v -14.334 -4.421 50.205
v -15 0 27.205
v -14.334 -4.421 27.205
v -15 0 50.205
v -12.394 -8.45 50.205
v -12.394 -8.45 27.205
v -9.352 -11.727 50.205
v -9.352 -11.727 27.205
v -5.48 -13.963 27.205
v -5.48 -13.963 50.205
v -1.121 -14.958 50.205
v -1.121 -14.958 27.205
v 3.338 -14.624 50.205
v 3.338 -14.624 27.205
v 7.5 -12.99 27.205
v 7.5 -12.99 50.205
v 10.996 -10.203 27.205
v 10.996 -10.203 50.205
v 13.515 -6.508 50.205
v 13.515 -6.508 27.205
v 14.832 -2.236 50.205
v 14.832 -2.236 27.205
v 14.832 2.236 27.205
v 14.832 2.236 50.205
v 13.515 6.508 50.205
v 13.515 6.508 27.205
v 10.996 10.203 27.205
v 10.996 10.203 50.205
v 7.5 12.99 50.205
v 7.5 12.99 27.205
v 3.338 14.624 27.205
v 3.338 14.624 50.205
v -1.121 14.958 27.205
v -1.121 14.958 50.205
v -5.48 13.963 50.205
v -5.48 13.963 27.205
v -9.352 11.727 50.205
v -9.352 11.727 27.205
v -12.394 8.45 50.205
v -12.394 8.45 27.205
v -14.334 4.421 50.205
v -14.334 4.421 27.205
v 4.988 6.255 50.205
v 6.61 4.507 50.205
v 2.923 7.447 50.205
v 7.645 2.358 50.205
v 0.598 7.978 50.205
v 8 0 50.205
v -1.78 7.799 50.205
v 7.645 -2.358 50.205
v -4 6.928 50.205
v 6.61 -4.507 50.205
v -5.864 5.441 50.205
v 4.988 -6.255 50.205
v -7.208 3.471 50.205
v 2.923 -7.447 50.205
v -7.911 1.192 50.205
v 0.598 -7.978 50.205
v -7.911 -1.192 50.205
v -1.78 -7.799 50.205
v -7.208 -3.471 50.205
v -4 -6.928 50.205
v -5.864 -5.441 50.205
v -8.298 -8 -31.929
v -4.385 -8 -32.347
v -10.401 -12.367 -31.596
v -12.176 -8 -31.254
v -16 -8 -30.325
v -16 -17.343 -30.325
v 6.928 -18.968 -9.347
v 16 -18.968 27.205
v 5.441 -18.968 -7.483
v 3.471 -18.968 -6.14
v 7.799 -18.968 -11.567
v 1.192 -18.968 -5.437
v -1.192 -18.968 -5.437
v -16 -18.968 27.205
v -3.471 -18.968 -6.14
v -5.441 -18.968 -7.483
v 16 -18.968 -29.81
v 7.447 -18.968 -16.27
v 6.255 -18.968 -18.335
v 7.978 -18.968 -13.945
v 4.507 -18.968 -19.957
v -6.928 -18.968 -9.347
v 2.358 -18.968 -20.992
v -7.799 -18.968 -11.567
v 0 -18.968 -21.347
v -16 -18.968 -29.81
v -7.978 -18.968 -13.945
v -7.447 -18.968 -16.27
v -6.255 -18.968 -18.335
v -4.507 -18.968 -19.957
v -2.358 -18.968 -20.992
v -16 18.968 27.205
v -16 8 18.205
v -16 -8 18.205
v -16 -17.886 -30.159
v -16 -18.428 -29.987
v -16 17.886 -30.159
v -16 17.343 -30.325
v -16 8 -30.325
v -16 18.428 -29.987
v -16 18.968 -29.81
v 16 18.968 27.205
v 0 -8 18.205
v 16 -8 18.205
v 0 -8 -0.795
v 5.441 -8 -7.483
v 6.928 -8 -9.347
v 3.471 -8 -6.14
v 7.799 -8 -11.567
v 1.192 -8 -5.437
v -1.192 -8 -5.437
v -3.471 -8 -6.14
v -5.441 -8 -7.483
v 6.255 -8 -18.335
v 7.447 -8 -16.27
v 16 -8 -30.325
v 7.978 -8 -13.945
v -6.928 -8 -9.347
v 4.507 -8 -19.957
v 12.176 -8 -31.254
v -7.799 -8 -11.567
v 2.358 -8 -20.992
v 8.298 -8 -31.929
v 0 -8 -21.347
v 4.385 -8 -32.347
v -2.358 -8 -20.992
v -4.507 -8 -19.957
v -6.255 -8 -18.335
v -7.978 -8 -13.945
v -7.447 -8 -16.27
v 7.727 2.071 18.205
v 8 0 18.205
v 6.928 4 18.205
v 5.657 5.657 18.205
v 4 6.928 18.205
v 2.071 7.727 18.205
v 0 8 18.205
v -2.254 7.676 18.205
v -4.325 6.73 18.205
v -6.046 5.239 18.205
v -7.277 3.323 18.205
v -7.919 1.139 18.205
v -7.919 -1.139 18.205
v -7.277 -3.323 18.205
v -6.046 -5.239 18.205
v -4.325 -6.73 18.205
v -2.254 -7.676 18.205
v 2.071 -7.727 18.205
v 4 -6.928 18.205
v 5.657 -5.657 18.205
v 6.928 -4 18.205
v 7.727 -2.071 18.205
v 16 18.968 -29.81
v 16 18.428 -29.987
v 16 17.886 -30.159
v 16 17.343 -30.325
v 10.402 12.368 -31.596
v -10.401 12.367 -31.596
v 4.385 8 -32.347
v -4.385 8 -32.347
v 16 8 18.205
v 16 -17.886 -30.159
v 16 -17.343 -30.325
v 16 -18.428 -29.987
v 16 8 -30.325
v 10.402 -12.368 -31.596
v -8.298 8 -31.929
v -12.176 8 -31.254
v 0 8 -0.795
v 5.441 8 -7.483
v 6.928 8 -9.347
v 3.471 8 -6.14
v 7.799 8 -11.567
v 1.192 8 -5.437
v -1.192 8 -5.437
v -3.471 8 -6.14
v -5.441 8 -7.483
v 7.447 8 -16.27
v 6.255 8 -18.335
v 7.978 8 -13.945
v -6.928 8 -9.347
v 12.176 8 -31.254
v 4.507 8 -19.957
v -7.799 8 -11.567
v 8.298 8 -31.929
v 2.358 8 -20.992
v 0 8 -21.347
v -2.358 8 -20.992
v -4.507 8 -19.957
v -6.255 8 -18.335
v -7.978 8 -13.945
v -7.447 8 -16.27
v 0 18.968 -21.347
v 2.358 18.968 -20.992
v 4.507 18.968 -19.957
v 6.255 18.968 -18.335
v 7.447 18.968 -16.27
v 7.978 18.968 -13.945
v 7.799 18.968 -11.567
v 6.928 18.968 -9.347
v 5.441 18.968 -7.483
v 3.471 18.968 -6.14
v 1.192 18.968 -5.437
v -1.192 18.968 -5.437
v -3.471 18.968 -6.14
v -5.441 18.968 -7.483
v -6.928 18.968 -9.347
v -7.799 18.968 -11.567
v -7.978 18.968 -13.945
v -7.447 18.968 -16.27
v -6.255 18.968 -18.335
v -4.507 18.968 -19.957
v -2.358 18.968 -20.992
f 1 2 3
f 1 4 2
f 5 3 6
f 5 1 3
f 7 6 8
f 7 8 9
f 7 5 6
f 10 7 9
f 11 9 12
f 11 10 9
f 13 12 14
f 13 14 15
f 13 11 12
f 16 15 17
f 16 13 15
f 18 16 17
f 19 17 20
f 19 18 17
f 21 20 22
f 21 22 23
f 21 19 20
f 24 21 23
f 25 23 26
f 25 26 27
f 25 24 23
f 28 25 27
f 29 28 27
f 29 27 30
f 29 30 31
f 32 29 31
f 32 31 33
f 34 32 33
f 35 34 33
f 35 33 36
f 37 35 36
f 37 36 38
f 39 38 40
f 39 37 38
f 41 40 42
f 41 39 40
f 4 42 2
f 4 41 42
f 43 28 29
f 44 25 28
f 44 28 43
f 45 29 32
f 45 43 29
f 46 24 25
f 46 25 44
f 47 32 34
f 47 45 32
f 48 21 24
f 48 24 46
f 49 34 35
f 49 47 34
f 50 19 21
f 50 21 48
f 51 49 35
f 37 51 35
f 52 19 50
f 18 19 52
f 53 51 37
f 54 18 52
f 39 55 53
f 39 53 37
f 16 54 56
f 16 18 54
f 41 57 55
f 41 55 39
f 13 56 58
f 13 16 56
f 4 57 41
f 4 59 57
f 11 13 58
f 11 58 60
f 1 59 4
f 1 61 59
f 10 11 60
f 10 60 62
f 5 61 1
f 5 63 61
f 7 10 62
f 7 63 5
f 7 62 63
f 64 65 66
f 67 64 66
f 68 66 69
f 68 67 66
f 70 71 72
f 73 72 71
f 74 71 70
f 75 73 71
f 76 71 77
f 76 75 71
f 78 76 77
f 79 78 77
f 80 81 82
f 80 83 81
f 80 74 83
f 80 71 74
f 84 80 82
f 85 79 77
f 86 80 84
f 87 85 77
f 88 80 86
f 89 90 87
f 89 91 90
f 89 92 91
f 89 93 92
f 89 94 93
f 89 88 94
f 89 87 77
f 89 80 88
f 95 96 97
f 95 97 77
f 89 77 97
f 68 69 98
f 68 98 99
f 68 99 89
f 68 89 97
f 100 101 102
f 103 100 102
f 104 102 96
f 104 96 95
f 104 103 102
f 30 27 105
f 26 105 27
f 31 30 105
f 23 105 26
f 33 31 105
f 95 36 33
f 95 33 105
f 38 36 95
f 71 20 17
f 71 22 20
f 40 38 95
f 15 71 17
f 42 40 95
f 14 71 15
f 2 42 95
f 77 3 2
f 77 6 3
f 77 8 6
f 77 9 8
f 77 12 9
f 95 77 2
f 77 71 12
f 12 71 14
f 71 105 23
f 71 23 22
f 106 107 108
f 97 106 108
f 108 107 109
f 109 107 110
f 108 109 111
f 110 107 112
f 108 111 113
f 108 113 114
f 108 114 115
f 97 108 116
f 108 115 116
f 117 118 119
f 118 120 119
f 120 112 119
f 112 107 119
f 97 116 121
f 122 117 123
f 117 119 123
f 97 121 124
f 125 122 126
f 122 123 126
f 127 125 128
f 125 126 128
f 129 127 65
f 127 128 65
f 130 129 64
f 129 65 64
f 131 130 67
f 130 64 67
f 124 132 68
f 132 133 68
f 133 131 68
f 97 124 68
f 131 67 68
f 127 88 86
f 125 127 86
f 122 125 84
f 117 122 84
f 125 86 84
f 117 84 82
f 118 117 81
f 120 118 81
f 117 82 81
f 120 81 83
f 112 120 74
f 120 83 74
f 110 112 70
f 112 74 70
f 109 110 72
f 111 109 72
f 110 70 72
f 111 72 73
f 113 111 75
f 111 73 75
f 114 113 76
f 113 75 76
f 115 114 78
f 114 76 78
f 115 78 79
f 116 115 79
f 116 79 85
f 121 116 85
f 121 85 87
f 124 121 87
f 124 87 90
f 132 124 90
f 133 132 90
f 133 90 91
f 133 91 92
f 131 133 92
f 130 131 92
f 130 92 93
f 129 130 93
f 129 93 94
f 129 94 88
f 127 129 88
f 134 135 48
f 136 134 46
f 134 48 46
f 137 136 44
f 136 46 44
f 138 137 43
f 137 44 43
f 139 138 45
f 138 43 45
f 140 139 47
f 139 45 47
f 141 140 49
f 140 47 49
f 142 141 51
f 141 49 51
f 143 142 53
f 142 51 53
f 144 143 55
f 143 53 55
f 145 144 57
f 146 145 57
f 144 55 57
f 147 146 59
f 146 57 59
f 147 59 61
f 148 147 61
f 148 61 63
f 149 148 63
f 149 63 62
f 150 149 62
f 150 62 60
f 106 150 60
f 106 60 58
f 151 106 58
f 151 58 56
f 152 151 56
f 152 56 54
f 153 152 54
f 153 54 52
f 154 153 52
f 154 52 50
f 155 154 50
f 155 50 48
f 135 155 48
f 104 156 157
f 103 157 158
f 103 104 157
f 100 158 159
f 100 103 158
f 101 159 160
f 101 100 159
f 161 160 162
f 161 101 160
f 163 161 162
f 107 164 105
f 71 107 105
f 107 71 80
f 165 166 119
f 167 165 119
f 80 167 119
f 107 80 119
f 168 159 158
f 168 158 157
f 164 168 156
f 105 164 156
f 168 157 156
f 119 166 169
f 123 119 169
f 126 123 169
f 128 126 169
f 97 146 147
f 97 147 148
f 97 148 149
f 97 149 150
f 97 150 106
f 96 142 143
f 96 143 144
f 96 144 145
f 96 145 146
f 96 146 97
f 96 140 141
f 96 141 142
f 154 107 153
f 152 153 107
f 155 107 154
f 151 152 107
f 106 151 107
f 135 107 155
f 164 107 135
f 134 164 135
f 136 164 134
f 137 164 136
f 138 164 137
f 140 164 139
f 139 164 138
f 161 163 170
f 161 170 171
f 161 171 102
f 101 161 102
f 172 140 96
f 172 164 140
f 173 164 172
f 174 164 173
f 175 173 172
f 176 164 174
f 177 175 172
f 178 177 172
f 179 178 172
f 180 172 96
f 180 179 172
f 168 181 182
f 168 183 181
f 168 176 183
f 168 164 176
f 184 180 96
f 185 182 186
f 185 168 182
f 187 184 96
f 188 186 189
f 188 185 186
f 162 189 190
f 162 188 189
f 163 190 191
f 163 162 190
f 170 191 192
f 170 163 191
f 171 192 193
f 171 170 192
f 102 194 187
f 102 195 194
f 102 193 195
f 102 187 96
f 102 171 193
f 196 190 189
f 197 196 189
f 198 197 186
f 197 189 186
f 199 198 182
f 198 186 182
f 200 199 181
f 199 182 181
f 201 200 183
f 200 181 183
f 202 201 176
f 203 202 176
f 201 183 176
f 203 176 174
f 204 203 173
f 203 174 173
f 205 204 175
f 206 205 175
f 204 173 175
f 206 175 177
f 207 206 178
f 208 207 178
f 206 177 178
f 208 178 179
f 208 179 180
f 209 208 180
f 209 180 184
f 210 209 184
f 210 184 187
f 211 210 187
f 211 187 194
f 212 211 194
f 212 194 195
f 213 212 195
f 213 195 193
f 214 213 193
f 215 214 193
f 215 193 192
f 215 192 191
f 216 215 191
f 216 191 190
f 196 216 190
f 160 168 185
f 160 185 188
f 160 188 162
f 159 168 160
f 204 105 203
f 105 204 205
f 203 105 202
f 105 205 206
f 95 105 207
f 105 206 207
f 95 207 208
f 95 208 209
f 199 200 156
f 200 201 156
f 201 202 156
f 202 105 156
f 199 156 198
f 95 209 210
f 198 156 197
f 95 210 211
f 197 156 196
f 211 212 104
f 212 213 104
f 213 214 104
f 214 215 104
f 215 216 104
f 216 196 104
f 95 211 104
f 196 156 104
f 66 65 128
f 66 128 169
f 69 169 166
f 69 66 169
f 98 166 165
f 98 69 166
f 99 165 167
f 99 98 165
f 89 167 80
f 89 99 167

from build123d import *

# Parameters (mm, degrees)
CROQUIS3_W            = 139.658435228
CROQUIS3_H            = 16
CORTAR_EXTRUIR1_DEPTH = 51
CROQUIS4_OUTSIDE_W    = 126.9
CROQUIS4_OUTSIDE_H    = 126.9
CROQUIS4_OUTSIDE_W_2  = 120.050230854
CROQUIS4_OUTSIDE_H_2  = 37.93587295
CORTAR_EXTRUIR2_DEPTH = 107.175895765
CROQUIS5_OUTSIDE_W    = 121.792
CROQUIS5_OUTSIDE_H    = 66.086
CROQUIS5_OUTSIDE_W_2  = 32
CROQUIS5_OUTSIDE_H_2  = 52.876669862
CORTAR_EXTRUIR4_DEPTH = 98.164515307
CROQUIS6_OUTSIDE_W    = 53.342
CROQUIS6_OUTSIDE_H    = 104.342
CROQUIS6_OUTSIDE_R    = 59.713814124
CORTAR_EXTRUIR5_DEPTH = 51
CORTAR_EXTRUIR6_START = -32
CORTAR_EXTRUIR6_DEPTH = 33
CROQUIS8_R            = 8
CORTAR_EXTRUIR7_DEPTH = 65.928309429
CROQUIS9_R            = 8
CORTAR_EXTRUIR8_DEPTH = 51


with BuildPart() as part:
    # Croquis1 → Revolución2 (revolve)
    with BuildSketch(Plane(origin=(0, 0, 0), x_dir=(1, 0, 0), z_dir=(0, 1, 0)), mode=Mode.PRIVATE) as revoluci_n2_sk:
        Polygon((15, -50.205128205), (0, -50.205128205), (0, -18.205128205), (8, -18.205128205), (8, 32.794871795), (46.820512821, 32.794871795), (46.820512821, -27.205128205), (15, -27.205128205), align=None)
    revolve(revoluci_n2_sk.sketch.rotate(Axis((0, 0, -124.102564103), (0, 0, 1)), 180), axis=Axis((0, 0, -124.102564103), (0, 0, 1)))

    # Croquis3 → Cortar-Extruir1 (cut)
    with BuildSketch(Plane(origin=(0, 0, -32.794871795), x_dir=(-1, 0, 0), z_dir=(0, 0, -1))):
        Rectangle(CROQUIS3_W, CROQUIS3_H)
    extrude(amount=-CORTAR_EXTRUIR1_DEPTH, mode=Mode.SUBTRACT)

    # Croquis4 outside → Cortar-Extruir2 (cut, through all)
    with BuildSketch(Plane(origin=(0, 0, -32.794871795), x_dir=(-1, 0, 0), z_dir=(0, 0, -1))):
        Rectangle(CROQUIS4_OUTSIDE_W, CROQUIS4_OUTSIDE_H)
        Rectangle(CROQUIS4_OUTSIDE_W_2, CROQUIS4_OUTSIDE_H_2, mode=Mode.SUBTRACT)
    extrude(amount=-CORTAR_EXTRUIR2_DEPTH, mode=Mode.SUBTRACT)

    # Croquis5 outside → Cortar-Extruir4 (cut, through all)
    with BuildSketch(Plane(origin=(0, 0, -32.794871795), x_dir=(-1, 0, 0), z_dir=(0, 0, -1))):
        Rectangle(CROQUIS5_OUTSIDE_W, CROQUIS5_OUTSIDE_H)
        Rectangle(CROQUIS5_OUTSIDE_W_2, CROQUIS5_OUTSIDE_H_2, mode=Mode.SUBTRACT)
    extrude(amount=-CORTAR_EXTRUIR4_DEPTH, mode=Mode.SUBTRACT)

    # Croquis6 outside → Cortar-Extruir5 (cut)
    with BuildSketch(Plane(origin=(0, 18.967936475, 0), x_dir=(1, 0, 0), z_dir=(0, 1, 0))):
        with Locations((0, -8.705)):
            Rectangle(CROQUIS6_OUTSIDE_W, CROQUIS6_OUTSIDE_H)
        with Locations((0, -27.205128205)):
            Circle(CROQUIS6_OUTSIDE_R, mode=Mode.SUBTRACT)
    extrude(amount=-CORTAR_EXTRUIR5_DEPTH, mode=Mode.SUBTRACT)


with BuildPart() as cortar_extruir5_kept_piece:
    # of the separate pieces the step leaves, the one the design keeps (cortar_extruir5_pieces_kept)
    add(part.part.solids().sort_by_distance((-15, 0, 50.205128205))[0])

    # Cortar-Extruir6: read off the stored shape, not the designer's step
    # Cortar-Extruir6 outline → Cortar-Extruir6 (cut)
    with BuildSketch(Plane(origin=(16, 0, 0), x_dir=(0, 0, -1), z_dir=(1, 0, 0)).offset(CORTAR_EXTRUIR6_START)):
        with BuildLine():
            ThreePointArc((29.810017934, 18.967936475), (31.336160338, 13.54352388), (32.347449433, 8))
            Line((32.347449433, 8), (33.422130035, 0))
            Line((33.422130035, 0), (34, 4.301705749))
            Line((34, 4.301705749), (34, 20))
            Line((34, 20), (29.466668549, 20))
            Line((29.466668549, 20), (29.810017934, 18.967936475))
        make_face()
        with BuildLine():
            Line((34, -4.301705749), (33.422130035, 0))
            Line((33.422130035, 0), (32.347449433, -8))
            ThreePointArc((32.347449433, -8), (31.336160338, -13.54352388), (29.810017934, -18.967936475))
            Line((29.810017934, -18.967936475), (29.466668549, -20))
            Line((29.466668549, -20), (34, -20))
            Line((34, -20), (34, -4.301705749))
        make_face()
    extrude(amount=CORTAR_EXTRUIR6_DEPTH, mode=Mode.SUBTRACT)

    # Croquis8 → Cortar-Extruir7 (cut, through all)
    with BuildSketch(Plane.XZ.offset(18.967936475)):
        with Locations(Location((0, -13.347449433, 0), (0, 0, 270))):
            Circle(CROQUIS8_R)
    extrude(amount=-CORTAR_EXTRUIR7_DEPTH, mode=Mode.SUBTRACT)

    # Croquis9 → Cortar-Extruir8 (cut)
    with BuildSketch(Plane.XY.offset(50.205128205)):
        Circle(CROQUIS9_R)
    extrude(amount=-CORTAR_EXTRUIR8_DEPTH, mode=Mode.SUBTRACT)


solid = cortar_extruir5_kept_piece.part
